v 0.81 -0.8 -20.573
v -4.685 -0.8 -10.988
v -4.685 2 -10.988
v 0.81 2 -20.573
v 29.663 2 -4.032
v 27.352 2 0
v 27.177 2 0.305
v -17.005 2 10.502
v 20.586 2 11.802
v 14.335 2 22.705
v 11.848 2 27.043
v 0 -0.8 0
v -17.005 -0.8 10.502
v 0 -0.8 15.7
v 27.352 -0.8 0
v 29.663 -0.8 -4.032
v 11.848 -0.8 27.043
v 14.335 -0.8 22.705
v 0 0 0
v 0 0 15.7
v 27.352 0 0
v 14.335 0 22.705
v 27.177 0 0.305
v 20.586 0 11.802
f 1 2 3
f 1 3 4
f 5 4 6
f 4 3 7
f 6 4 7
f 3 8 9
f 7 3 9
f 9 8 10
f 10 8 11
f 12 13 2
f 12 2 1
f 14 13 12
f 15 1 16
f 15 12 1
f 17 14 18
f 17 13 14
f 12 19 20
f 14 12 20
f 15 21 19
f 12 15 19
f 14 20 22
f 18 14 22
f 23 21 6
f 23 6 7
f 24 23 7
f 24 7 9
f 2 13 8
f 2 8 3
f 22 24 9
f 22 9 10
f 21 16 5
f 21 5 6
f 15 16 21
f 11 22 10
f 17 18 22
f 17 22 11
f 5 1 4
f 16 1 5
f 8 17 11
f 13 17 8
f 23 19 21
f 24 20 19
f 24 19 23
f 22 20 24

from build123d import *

# Parameters (mm, degrees)
F1_DEPTH = 0.8
F2_DEPTH = 2


with BuildPart() as f1:
    # F0 (on Front) → F1 (new body)
    with BuildSketch(Plane.XZ):
        Polygon((25, 0), (0, 0), (0, 15.7), (14.3351472552, 22.7054297943), (11.8484024629, 27.0431827077), (-17.0050778452, 10.5020741364), (-4.685329569, -10.9878769608), (0.8098351958, -20.5733668117), (29.663315504, -4.0322582404), (27.3517045431, 0), align=None)
    extrude(amount=F1_DEPTH)

    # F0 (on Front) → F2 (join)
    with BuildSketch(Plane.XZ):
        Polygon((25, 0), (0, 0), (0, 15.7), (14.3351472552, 22.7054297943), (11.8484024629, 27.0431827077), (-17.0050778452, 10.5020741364), (-4.685329569, -10.9878769608), (0.8098351958, -20.5733668117), (29.663315504, -4.0322582404), (27.3517045431, 0), align=None)
        Polygon((0, 15.7), (0, 0), (20.5860966838, 11.8015870761), (14.3351472552, 22.7054297943), align=None)
        Polygon((20.5860966838, 11.8015870761), (0, 0), (25, 0), align=None)
        Polygon((20.5860966838, 11.8015870761), (25, 0), (27.3517045431, 0), (27.1765707117, 0.305494673), align=None)
    extrude(amount=-F2_DEPTH)


solid = f1.part
